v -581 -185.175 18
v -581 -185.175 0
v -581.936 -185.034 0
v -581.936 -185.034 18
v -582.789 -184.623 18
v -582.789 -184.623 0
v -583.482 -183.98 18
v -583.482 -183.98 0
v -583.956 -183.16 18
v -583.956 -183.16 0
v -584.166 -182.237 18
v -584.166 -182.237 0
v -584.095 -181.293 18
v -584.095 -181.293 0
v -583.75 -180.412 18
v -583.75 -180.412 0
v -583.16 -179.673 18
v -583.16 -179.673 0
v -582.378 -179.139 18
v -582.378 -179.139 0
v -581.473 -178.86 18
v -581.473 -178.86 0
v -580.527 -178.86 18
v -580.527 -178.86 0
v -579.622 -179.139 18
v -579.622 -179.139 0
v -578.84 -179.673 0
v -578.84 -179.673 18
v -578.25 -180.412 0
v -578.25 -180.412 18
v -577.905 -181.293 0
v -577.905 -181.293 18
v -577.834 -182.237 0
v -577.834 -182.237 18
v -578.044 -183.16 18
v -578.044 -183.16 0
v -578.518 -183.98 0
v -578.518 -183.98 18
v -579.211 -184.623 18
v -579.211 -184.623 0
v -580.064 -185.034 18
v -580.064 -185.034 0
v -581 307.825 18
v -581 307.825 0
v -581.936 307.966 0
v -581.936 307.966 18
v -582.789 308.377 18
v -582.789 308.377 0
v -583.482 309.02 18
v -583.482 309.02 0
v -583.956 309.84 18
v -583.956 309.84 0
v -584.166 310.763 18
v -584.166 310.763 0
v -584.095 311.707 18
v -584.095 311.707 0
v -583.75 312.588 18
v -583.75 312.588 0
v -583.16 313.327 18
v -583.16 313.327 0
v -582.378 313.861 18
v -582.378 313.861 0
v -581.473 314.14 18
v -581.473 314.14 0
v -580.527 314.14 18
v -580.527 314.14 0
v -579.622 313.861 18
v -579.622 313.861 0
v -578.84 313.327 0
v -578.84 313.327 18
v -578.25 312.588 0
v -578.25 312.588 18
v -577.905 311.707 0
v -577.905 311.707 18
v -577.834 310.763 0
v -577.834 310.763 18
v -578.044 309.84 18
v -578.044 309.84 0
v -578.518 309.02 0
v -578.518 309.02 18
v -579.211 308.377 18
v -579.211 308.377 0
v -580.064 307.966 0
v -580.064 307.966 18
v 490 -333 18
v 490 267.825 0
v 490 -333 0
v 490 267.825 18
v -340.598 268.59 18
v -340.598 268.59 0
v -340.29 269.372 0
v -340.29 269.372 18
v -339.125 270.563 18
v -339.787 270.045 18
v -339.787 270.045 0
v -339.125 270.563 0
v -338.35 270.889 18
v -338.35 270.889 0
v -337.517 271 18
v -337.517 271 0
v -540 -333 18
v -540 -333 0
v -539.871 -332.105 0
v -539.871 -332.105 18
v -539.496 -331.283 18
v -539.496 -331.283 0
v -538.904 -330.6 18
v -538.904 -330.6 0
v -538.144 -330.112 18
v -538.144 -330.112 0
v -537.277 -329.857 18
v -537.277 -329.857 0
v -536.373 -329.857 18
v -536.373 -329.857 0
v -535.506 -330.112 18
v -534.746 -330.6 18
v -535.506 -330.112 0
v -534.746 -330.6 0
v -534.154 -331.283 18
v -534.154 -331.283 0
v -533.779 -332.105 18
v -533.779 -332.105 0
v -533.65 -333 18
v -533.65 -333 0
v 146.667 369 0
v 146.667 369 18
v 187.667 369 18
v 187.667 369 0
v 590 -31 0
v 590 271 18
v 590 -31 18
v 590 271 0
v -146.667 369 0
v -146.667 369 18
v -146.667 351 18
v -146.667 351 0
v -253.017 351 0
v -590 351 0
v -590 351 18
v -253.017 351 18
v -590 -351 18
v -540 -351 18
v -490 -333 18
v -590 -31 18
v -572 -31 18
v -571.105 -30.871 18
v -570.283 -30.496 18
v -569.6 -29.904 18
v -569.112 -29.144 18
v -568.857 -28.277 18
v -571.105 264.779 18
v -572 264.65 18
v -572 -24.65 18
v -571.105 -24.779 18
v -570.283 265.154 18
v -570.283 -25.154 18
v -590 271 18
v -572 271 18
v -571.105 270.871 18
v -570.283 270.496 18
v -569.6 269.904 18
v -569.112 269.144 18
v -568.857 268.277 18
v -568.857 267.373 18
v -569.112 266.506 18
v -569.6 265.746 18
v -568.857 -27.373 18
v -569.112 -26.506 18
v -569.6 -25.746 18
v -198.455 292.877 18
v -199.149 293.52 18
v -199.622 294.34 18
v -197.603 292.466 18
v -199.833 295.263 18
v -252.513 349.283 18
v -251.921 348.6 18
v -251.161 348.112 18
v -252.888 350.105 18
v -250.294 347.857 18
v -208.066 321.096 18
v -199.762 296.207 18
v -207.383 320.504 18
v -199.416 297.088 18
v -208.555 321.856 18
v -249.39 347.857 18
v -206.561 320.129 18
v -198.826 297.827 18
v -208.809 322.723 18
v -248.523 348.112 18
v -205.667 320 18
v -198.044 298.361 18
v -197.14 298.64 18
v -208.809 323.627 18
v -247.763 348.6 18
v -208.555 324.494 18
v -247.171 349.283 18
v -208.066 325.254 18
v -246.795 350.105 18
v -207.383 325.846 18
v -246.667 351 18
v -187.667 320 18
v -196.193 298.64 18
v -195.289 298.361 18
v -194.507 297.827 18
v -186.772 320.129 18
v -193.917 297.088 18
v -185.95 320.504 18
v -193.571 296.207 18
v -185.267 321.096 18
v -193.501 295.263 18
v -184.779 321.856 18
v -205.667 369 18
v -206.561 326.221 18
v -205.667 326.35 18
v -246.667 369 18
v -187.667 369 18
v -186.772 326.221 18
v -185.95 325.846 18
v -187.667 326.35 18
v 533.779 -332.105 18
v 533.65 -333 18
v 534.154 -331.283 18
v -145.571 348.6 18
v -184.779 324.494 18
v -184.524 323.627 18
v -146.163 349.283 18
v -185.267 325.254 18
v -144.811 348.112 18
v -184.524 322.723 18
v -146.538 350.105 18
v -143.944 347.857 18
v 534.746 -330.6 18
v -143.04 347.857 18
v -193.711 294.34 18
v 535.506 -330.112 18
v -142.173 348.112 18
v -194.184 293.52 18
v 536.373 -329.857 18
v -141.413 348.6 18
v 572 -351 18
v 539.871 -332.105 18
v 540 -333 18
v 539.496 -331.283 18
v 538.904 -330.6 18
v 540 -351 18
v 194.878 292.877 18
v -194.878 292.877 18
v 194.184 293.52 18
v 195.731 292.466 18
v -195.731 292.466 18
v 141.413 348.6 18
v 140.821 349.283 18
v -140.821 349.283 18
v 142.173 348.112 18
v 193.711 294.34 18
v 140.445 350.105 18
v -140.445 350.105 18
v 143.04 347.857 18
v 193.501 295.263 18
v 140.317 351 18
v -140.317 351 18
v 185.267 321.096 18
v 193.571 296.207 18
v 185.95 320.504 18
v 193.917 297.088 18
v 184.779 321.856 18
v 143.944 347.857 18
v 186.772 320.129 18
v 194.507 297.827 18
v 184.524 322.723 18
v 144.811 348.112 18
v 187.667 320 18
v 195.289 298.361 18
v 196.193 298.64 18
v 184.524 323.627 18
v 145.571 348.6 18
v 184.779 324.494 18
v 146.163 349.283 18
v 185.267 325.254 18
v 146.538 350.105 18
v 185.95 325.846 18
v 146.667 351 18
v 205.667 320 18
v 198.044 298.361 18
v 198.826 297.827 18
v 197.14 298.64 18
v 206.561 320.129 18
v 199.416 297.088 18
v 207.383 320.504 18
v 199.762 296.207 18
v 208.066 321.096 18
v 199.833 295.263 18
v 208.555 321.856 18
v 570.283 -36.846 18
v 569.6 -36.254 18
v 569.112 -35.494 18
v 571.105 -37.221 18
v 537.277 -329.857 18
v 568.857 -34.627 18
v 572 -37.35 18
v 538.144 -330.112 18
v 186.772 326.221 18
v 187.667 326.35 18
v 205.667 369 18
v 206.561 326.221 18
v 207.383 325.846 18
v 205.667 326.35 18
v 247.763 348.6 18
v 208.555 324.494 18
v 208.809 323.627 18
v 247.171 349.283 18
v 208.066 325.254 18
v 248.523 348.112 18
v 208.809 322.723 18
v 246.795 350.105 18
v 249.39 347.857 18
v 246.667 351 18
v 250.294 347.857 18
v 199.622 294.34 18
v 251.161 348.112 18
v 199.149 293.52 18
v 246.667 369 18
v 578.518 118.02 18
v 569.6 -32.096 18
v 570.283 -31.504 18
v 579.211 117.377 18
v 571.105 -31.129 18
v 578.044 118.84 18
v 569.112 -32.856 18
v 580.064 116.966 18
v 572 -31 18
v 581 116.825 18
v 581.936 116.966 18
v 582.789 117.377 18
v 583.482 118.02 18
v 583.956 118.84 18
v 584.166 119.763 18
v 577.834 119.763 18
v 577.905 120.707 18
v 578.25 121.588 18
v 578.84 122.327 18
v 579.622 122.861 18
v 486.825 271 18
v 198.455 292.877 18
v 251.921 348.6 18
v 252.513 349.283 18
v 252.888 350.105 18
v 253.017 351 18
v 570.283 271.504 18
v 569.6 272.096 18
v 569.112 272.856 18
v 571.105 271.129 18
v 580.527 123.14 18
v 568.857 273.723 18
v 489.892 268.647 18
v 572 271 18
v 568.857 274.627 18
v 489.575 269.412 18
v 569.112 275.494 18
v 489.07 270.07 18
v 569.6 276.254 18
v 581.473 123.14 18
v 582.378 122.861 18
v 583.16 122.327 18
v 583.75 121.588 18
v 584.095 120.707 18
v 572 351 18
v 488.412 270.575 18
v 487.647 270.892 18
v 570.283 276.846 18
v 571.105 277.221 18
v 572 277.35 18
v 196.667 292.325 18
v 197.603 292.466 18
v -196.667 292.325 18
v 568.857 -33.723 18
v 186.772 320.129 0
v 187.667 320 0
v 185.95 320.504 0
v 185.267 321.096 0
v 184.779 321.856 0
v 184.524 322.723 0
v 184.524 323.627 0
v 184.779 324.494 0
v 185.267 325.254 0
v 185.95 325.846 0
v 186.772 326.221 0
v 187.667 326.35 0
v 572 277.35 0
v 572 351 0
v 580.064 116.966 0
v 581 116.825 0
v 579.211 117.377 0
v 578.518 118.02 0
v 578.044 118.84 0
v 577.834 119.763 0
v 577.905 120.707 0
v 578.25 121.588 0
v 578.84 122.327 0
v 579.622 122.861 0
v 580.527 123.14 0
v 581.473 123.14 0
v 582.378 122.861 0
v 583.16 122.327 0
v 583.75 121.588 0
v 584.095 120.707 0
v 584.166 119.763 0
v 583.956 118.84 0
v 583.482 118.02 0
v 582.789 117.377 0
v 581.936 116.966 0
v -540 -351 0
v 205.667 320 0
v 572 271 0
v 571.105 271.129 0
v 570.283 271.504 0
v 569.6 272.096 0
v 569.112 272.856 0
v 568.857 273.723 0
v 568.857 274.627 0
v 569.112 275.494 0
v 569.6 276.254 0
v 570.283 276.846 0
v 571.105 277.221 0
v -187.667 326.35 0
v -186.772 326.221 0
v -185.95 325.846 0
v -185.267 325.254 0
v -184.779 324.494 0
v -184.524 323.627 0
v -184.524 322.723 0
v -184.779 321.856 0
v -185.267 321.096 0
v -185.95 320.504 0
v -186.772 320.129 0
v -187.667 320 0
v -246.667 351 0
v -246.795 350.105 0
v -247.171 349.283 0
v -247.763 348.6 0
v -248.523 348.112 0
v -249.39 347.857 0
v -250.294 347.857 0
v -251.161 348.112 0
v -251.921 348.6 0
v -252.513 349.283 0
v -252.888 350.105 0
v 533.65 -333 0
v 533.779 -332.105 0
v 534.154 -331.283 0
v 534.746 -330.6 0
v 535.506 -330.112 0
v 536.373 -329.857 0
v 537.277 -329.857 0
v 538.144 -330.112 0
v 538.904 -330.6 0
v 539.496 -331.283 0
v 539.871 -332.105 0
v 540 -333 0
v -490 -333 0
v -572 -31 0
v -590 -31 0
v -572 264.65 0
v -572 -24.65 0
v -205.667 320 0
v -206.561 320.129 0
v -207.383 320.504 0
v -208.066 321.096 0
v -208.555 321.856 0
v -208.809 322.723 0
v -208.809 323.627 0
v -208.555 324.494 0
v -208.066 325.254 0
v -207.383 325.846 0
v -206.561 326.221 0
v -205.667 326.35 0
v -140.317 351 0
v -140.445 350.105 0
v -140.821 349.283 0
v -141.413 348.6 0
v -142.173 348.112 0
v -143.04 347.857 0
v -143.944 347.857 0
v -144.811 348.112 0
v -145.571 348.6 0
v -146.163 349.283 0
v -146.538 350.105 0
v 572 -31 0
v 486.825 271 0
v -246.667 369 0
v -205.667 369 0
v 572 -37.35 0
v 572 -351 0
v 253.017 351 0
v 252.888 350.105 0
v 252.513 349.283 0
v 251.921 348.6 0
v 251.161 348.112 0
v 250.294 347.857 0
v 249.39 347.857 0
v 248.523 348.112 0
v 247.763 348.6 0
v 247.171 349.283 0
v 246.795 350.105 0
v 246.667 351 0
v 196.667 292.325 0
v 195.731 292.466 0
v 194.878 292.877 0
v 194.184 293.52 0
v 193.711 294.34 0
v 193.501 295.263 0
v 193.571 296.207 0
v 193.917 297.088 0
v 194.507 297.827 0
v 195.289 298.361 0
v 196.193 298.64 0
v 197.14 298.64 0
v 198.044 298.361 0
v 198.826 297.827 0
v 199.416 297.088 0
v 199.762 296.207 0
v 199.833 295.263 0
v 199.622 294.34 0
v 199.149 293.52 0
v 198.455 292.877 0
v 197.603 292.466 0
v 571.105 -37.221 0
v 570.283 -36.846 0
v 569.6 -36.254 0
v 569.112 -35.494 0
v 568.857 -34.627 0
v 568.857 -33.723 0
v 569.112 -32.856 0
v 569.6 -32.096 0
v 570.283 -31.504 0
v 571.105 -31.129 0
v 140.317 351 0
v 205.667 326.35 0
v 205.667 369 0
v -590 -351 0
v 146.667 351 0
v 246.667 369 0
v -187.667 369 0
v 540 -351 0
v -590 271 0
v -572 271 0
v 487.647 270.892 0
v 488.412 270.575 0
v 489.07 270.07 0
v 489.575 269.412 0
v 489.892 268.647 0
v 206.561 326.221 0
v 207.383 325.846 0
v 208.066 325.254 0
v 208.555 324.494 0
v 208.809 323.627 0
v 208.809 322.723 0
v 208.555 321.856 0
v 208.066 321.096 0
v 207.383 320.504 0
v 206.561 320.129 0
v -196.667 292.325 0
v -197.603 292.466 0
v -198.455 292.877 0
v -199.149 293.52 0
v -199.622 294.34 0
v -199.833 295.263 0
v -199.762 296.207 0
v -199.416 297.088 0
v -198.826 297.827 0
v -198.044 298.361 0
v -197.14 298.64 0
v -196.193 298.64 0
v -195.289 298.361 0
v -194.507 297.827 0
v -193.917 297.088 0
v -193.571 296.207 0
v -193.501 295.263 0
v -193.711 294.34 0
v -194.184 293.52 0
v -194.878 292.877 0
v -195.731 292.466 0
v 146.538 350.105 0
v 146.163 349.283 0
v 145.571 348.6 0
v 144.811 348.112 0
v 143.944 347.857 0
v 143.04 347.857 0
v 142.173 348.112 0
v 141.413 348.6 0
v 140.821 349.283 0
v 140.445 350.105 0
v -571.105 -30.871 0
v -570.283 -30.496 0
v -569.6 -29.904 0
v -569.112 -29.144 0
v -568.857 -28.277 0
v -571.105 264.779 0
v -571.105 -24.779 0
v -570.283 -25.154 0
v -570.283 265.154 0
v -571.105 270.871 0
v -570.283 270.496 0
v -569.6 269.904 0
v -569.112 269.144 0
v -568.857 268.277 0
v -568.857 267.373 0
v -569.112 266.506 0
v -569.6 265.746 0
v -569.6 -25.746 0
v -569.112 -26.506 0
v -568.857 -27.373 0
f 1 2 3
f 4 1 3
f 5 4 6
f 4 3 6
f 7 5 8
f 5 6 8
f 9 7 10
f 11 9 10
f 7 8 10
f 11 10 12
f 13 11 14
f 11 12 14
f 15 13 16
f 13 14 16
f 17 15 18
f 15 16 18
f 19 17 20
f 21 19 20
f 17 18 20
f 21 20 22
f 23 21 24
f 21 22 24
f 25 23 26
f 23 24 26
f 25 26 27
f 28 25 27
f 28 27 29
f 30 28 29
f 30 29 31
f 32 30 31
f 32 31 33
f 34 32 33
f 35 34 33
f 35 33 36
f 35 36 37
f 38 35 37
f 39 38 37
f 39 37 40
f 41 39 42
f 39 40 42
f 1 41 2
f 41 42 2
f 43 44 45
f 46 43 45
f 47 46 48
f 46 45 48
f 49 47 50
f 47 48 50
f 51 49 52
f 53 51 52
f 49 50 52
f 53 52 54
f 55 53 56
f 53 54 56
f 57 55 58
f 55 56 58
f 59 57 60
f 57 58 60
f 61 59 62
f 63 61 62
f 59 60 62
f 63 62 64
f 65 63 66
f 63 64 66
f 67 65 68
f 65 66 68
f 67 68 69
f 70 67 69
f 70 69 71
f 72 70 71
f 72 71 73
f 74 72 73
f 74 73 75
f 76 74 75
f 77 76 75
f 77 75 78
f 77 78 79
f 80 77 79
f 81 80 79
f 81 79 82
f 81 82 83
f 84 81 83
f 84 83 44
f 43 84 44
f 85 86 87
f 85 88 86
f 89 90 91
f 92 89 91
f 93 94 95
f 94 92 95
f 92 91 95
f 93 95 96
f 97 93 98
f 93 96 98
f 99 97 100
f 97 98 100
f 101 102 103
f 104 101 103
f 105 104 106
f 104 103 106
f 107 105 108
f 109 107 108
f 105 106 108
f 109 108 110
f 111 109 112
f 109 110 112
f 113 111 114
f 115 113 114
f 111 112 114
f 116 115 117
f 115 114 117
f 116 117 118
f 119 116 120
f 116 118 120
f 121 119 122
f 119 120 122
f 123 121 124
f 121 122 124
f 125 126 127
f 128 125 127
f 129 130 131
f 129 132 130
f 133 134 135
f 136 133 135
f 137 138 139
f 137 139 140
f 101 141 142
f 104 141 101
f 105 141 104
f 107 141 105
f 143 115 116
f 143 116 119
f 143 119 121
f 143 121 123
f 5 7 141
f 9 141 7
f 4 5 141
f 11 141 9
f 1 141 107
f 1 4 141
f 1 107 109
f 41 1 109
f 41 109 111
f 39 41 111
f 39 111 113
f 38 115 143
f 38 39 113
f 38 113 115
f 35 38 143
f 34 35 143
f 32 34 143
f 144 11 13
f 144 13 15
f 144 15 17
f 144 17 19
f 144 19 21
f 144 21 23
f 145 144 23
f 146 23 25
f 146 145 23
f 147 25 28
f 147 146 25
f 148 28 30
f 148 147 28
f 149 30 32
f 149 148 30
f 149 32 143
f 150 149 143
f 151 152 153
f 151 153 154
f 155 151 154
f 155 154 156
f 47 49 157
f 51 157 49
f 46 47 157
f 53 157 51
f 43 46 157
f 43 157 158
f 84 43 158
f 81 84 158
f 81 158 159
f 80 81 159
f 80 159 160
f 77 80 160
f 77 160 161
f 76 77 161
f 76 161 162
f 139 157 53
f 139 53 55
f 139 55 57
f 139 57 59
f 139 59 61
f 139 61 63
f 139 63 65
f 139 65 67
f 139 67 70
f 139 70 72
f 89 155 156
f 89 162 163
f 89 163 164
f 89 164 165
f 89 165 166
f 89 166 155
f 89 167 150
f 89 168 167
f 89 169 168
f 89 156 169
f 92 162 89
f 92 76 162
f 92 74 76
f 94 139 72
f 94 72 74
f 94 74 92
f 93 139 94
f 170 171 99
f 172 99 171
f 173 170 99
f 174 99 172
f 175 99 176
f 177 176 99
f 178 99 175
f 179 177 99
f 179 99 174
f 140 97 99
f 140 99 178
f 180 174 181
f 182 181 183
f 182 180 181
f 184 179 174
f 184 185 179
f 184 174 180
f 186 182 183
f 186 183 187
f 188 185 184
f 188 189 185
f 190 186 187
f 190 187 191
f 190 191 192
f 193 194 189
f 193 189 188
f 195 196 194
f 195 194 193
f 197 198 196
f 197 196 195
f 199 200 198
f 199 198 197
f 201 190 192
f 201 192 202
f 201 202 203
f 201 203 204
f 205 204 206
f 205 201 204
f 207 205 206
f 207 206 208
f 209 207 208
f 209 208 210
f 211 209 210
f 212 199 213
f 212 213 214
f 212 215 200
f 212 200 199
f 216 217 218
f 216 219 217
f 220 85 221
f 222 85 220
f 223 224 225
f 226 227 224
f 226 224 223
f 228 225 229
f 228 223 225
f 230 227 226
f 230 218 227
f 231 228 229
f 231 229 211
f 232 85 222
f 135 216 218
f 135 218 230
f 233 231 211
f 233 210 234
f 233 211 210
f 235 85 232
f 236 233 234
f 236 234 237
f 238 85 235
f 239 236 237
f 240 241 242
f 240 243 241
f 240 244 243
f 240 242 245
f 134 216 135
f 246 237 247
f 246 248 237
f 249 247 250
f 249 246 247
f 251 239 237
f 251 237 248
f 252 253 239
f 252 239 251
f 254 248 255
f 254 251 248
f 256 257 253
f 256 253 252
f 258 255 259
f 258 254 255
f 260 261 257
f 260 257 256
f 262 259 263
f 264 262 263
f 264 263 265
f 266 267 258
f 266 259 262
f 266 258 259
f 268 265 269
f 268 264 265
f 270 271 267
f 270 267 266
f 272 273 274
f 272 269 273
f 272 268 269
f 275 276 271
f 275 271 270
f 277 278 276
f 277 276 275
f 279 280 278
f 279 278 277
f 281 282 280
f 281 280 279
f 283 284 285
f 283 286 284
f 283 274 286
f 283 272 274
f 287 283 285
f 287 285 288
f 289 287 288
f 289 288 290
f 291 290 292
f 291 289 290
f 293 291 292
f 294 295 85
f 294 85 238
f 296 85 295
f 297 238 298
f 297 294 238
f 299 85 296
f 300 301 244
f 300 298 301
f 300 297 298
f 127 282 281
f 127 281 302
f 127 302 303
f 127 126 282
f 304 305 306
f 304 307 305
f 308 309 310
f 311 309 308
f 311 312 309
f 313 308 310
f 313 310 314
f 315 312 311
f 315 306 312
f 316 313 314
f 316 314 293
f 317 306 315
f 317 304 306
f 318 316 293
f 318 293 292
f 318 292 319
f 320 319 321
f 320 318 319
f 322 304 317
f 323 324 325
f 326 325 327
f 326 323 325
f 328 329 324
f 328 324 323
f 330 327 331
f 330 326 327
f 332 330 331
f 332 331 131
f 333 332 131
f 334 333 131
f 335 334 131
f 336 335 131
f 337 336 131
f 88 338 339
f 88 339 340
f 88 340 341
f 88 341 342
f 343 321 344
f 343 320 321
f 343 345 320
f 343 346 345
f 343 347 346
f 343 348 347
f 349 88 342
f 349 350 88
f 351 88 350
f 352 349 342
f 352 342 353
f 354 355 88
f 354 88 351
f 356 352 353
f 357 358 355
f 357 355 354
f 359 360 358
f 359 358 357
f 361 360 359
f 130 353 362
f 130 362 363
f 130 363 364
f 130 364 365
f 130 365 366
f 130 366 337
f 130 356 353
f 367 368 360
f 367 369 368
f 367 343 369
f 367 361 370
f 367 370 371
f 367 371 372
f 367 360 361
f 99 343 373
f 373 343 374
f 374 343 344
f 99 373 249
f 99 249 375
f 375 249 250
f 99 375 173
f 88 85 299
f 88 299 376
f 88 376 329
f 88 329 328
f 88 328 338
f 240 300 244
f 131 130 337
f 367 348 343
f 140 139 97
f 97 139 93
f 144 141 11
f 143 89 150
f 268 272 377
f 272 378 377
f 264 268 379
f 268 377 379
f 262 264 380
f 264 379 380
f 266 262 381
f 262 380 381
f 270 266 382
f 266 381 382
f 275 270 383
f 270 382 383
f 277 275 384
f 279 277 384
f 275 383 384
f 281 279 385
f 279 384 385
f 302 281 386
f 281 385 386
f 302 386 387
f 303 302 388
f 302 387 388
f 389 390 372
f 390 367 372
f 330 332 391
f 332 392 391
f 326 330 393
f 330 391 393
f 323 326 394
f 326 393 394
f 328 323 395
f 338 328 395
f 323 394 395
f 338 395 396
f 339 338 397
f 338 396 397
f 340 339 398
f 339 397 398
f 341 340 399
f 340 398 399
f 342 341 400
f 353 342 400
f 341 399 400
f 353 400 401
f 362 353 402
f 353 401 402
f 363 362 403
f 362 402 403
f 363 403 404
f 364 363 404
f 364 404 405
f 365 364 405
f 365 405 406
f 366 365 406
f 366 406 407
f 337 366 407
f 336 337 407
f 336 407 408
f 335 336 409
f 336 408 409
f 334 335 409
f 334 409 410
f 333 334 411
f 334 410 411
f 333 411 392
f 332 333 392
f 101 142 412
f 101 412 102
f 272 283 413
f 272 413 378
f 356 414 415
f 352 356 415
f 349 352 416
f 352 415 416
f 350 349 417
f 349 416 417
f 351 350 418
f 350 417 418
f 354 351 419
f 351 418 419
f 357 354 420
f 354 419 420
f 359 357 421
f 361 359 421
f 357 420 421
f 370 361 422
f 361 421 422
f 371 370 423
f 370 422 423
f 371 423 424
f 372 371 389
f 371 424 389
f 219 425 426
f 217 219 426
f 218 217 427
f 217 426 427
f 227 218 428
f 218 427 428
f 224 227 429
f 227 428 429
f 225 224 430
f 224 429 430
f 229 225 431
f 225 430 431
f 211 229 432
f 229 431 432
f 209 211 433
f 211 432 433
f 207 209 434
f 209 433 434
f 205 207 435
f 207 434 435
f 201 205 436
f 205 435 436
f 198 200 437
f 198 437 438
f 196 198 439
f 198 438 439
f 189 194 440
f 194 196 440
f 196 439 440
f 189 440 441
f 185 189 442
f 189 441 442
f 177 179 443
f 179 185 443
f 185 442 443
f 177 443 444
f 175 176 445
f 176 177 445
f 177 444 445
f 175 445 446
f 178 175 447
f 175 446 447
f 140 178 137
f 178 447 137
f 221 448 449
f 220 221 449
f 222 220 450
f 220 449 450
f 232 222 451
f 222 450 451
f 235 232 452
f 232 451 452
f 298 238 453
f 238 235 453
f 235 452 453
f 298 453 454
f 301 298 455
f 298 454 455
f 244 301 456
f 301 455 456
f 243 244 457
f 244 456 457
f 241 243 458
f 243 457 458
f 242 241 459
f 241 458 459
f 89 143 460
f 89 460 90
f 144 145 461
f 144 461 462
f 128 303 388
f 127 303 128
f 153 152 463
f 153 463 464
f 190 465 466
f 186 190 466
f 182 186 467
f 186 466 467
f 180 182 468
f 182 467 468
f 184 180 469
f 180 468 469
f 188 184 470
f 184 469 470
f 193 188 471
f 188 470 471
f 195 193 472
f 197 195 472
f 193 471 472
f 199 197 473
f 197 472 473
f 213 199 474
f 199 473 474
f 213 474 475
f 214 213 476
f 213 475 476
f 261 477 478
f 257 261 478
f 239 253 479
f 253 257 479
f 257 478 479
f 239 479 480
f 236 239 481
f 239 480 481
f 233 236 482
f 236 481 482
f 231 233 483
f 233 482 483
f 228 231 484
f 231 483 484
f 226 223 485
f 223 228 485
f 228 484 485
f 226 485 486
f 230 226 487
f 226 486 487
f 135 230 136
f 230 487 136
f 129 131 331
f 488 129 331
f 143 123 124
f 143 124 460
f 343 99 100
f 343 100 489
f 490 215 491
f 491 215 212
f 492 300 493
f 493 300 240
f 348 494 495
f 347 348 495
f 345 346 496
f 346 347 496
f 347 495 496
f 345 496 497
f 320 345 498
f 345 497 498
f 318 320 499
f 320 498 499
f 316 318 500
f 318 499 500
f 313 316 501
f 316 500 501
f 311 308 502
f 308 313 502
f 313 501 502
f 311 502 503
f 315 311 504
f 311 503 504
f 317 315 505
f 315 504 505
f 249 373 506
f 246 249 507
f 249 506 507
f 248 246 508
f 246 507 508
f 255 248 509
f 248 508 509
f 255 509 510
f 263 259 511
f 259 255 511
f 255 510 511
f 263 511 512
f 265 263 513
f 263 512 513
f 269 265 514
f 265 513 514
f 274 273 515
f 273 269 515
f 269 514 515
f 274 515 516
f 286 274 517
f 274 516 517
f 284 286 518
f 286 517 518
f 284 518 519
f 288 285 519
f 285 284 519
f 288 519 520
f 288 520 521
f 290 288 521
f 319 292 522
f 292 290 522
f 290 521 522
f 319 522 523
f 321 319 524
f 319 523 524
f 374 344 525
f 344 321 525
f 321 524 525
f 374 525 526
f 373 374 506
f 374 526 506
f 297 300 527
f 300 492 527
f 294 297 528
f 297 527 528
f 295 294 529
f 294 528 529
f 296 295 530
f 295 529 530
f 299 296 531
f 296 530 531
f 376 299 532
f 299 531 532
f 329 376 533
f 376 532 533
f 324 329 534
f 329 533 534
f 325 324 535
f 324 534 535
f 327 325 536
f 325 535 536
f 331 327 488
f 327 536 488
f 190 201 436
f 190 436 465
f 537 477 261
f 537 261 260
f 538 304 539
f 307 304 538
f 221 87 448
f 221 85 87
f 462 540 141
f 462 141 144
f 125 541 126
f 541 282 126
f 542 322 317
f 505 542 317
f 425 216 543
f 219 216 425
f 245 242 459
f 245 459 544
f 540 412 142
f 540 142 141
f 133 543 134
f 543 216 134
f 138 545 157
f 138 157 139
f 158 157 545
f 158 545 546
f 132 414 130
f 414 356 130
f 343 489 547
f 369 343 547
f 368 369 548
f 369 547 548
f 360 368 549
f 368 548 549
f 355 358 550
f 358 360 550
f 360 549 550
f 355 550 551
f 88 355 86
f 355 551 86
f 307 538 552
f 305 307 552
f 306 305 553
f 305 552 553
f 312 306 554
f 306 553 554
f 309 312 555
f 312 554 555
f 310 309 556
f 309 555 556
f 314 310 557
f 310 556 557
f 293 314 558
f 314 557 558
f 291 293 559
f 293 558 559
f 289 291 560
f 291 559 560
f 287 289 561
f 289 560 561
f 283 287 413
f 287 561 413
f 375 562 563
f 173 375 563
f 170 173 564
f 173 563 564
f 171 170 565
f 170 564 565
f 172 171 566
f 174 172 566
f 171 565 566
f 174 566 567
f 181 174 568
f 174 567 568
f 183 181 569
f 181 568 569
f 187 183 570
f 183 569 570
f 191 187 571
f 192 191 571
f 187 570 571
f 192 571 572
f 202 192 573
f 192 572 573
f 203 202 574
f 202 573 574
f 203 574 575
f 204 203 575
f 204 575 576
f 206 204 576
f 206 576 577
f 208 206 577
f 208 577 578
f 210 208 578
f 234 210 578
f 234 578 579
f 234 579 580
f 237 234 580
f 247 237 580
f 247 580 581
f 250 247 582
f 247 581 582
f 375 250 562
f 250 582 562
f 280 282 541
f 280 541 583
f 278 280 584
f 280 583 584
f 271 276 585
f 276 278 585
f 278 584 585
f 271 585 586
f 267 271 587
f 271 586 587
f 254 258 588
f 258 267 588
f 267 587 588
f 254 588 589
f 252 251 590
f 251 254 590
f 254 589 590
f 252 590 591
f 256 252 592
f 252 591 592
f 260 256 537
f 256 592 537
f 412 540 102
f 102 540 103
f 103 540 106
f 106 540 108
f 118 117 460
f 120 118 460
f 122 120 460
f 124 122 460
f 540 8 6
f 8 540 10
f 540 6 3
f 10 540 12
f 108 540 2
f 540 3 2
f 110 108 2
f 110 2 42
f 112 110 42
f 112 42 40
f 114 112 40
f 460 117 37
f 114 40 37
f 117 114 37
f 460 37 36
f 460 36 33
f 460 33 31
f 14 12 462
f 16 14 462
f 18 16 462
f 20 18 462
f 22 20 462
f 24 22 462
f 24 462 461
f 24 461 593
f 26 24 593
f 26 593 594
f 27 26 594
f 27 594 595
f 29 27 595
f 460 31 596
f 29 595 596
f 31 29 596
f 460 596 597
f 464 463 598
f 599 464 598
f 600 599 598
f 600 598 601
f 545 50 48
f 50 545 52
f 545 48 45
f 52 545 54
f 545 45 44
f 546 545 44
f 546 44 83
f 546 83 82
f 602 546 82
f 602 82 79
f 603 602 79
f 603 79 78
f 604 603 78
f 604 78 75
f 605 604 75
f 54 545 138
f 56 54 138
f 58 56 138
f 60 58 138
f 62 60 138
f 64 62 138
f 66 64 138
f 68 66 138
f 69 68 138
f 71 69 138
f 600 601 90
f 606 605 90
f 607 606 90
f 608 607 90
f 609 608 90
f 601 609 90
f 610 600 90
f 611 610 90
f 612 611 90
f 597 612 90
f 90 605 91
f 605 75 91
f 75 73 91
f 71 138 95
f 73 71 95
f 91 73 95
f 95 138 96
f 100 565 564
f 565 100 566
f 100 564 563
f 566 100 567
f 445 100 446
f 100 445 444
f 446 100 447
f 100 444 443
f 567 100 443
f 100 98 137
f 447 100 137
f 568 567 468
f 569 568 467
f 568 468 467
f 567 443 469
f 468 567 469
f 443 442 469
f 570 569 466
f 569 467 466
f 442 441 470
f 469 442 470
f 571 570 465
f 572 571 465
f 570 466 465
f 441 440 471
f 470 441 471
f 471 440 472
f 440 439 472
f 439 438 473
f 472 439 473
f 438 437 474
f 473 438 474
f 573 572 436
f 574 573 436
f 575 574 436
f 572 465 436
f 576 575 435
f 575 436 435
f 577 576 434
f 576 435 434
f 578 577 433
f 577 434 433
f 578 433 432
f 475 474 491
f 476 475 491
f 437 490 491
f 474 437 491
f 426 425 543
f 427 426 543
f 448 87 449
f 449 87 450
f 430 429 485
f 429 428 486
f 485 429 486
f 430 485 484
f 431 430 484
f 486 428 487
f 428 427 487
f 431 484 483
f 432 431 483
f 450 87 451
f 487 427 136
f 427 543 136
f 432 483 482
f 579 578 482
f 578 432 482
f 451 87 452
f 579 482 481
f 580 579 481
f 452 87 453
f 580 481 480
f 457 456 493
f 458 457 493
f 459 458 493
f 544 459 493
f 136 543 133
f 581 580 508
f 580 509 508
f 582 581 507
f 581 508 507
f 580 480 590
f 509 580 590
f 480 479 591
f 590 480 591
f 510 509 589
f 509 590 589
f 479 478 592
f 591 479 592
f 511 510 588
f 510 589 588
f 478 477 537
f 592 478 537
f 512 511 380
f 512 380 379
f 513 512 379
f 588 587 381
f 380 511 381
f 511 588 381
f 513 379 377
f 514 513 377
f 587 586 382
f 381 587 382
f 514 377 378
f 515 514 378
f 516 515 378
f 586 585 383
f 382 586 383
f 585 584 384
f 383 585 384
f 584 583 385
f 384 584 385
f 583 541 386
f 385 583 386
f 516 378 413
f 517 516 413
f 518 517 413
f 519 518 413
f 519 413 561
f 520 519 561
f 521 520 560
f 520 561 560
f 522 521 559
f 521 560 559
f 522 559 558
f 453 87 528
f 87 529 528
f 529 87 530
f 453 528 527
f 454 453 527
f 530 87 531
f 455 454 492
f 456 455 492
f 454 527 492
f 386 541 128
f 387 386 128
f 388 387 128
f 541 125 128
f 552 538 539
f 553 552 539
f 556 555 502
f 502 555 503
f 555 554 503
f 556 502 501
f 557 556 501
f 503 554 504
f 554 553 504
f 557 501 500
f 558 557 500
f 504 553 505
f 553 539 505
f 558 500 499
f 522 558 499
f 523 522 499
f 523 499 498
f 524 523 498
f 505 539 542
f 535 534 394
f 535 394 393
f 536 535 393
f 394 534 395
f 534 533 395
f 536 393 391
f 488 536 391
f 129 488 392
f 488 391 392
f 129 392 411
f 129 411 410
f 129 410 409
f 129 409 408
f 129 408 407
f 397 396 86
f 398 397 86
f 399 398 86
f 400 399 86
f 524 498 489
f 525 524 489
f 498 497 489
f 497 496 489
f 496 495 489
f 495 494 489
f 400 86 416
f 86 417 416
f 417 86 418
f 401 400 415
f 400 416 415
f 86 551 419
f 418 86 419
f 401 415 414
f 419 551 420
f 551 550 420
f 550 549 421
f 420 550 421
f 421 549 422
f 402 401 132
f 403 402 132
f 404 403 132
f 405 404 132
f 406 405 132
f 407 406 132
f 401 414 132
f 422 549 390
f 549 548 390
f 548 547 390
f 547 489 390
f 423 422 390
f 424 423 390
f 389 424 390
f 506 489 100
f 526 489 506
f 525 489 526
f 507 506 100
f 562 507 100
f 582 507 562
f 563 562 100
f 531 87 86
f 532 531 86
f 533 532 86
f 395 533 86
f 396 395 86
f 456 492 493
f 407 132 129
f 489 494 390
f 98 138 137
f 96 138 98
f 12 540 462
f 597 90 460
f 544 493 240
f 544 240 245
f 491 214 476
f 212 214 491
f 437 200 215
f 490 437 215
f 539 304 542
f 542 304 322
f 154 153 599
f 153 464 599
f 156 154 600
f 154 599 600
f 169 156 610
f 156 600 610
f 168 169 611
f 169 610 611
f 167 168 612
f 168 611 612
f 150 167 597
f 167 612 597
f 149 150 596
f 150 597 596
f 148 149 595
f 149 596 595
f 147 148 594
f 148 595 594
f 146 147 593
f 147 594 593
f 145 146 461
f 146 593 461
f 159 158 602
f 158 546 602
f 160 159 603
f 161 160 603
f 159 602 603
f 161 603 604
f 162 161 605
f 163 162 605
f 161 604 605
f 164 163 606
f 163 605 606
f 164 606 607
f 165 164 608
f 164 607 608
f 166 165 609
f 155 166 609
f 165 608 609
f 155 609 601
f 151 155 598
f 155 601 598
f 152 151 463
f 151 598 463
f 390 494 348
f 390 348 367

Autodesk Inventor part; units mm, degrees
sketch "Sketch1" plane through (0, 0, 0) normal (0, 0, 1) x (1, 0, 0)
  line L0 (-590, 351) -> (590, 351)
  line L1 (590, 351) -> (590, -351)
  line L2 (590, -351) -> (-590, -351)
  line L3 (-590, -351) -> (-590, 351)
  point P0 (0, 0)
  point P1 (590, 0)
  point P2 (0, 351)
  dimension "d0" = 1180
  dimension "d1" = 702
extrude "Extrusion1" add sketch "Sketch1" along normal blind 18
sketch "Sketch2" plane through (0, 0, 18) normal (0, 0, 1) x (1, 0, 0)
  line L0 (590, 351) -> (-590, 351) projected
  line L1 (-590, 351) -> (-590, -351) projected
  line L2 (-590, -351) -> (590, -351) projected
  line L3 (590, -351) -> (590, 351) projected
  line L4 (-590, -351) -> (-490, -351) construction
  line L5 (-590, 351) -> (-590, -351) construction
  line L6 (590, 351) -> (-590, 351) construction
  line L7 (0, 351) -> (0, -351) construction
  line L8 (590, -351) -> (490, -351) construction
  line L9 (-590, 271) -> (590, 271) construction
  line L10 (-590, 271) -> (-340, 271) construction
  line L11 (-340, 271) -> (490, 271)
  line L12 (490, 271) -> (490, -351)
  line L13 (490, -351) -> (-490, -351)
  line L14 (-490, -351) -> (-490, -333)
  line L15 (-490, -333) -> (-340, 271)
  point P0 (0, 0)
  point P1 (-590, 0)
  point P2 (-590, 0)
  point P3 (-540, -351)
  point P4 (540, -351)
  point P5 (-590, 0)
  point P6 (590, 0)
  point P7 (-590, 0)
  point P8 (-465, 271)
  point P9 (0, 271)
  dimension "d4" = 100
  dimension "d5" = 80
  dimension "d6" = 250
  dimension "d97" = 18
extrude "Extrusion2" cut sketch "Sketch2" against normal blind 18 contours L2 L14 L15 L11 L12
sketch "Sketch3" plane through (0, 0, 18) normal (0, 0, 1) x (1, 0, 0)
  line L0 (-340, 271) -> (490, 271) projected
  line L1 (490, 271) -> (490, -351) projected
  line L2 (490, -351) -> (590, -351) projected
  line L3 (590, -351) -> (590, 351) projected
  line L4 (590, 351) -> (-590, 351) projected
  line L5 (-590, 351) -> (-590, -351) projected
  line L6 (-540, -333) -> (540, -333)
  line L7 (540, -333) -> (540, -351)
  line L8 (540, -351) -> (-540, -351)
  line L9 (-540, -351) -> (-540, -333)
  line L10 (490, -351) -> (590, -351) projected
  line L11 (-590, -351) -> (590, -351) projected
  line L12 (-590, -351) -> (-490, -351) projected
  line L13 (-490, -351) -> (-490, -333) projected
  line L14 (-490, -333) -> (-340, 271) projected
  point P0 (0, 0)
  point P1 (540, -351)
  point P2 (0, -351)
  point P3 (-540, -351)
  point P4 (540, -342)
  point P5 (540, -351)
  point P6 (-540, -342)
  point P7 (-540, -351)
  dimension "d10" = 18
extrude "Extrusion3" cut sketch "Sketch3" against normal blind 18 contours L13 L8 L9 L6 | L6 L1 L8 L13 | L6 L7 L2 L1
sketch "Sketch4" plane through (0, 0, 18) normal (0, 0, 1) x (1, 0, 0)
  line L0 (540, -333) -> (540, -351) projected
  line L1 (540, -351) -> (590, -351) projected
  line L2 (590, -351) -> (590, 351) projected
  line L3 (590, 351) -> (-590, 351) projected
  line L4 (-590, 351) -> (-590, -351) projected
  line L5 (-590, -351) -> (-540, -351) projected
  line L6 (-540, -351) -> (-540, -333) projected
  line L7 (-540, -333) -> (-490, -333) projected
  line L8 (-340, 271) -> (490, 271) projected
  line L9 (490, 271) -> (490, -333) projected
  line L10 (490, -333) -> (540, -333) projected
  line L11 (590, -31) -> (572, -31)
  line L12 (572, -31) -> (572, -351)
  line L13 (572, -351) -> (590, -351)
  line L14 (590, -351) -> (590, -31)
  line L15 (-490, -333) -> (-340, 271) projected
  point P0 (0, 0)
  point P1 (581, -351)
  point P2 (565, -351)
  point P3 (590, -191)
  point P4 (590, 0)
  point P5 (581, -31)
  point P6 (490, -31)
  dimension "d13" = 18
extrude "Extrusion4" cut sketch "Sketch4" against normal blind 18 contours L12 L11 L2 L1
sketch "Sketch5" plane through (0, 0, 18) normal (0, 0, 1) x (1, 0, 0)
  line L0 (-590, 271) -> (-572, 271)
  line L1 (-572, 271) -> (-572, -31)
  line L2 (-572, -31) -> (-590, -31)
  line L3 (-590, -31) -> (-590, 271)
  line L4 (572, -31) -> (590, -31) projected
  line L5 (590, -31) -> (590, 351) projected
  line L6 (590, 351) -> (-590, 351) projected
  line L7 (-590, 351) -> (-590, -351) projected
  line L8 (-590, -351) -> (-540, -351) projected
  line L9 (-540, -351) -> (-540, -333) projected
  line L10 (-540, -333) -> (-490, -333) projected
  line L11 (-340, 271) -> (490, 271) projected
  line L12 (490, 271) -> (490, -333) projected
  line L13 (490, -333) -> (540, -333) projected
  line L14 (540, -333) -> (540, -351) projected
  line L15 (540, -351) -> (572, -351) projected
  line L16 (572, -351) -> (572, -31) projected
  line L17 (-490, -333) -> (-340, 271) projected
  point P0 (0, 0)
  point P1 (-581, -31)
  point P2 (581, -31)
  point P3 (-581, 271)
  point P4 (75, 271)
  point P5 (-590, 120)
  point P6 (-590, 0)
  dimension "d16" = 18
extrude "Extrusion5" cut sketch "Sketch5" against normal blind 18 contours L0 L1 L2 L3
sketch "Sketch6" plane through (0, 0, 18) normal (0, 0, 1) x (1, 0, 0)
  line L0 (-590, 271) -> (-572, 271) projected
  line L1 (-572, 271) -> (-572, -31) projected
  line L2 (-572, -31) -> (-590, -31) projected
  line L3 (-590, -31) -> (-590, -351) projected
  line L4 (-590, -351) -> (-540, -351) projected
  line L5 (-540, -351) -> (-540, -333) projected
  line L6 (-540, -333) -> (-490, -333) projected
  line L7 (-340, 271) -> (490, 271) projected
  line L8 (490, 271) -> (490, -333) projected
  line L9 (490, -333) -> (540, -333) projected
  line L10 (540, -333) -> (540, -351) projected
  line L11 (540, -351) -> (572, -351) projected
  line L12 (572, -351) -> (572, -31) projected
  line L13 (572, -31) -> (590, -31) projected
  line L14 (590, -31) -> (590, 351) projected
  line L15 (590, 351) -> (-590, 351) projected
  line L16 (-590, 351) -> (-590, 271) projected
  line L17 (590, 351) -> (572, 351)
  line L18 (572, 351) -> (572, 271)
  line L19 (572, 271) -> (590, 271)
  line L20 (590, 271) -> (590, 351)
  line L21 (-490, -333) -> (-340, 271) projected
  point P0 (0, 0)
  point P1 (581, 351)
  point P2 (0, 351)
  point P3 (581, 271)
  point P4 (75, 271)
  point P5 (590, 311)
  point P6 (590, 160)
  dimension "d19" = 18
extrude "Extrusion6" cut sketch "Sketch6" against normal blind 18 contours L15 L14 L19 L18
fillet "Fillet1" radius 3.175 2 edges at (-340, 271, 9) (490, 271, 9)
sketch "Sketch7" plane through (0, 0, 18) normal (0, 0, 1) x (1, 0, 0)
  line L0 (-246.6667, 369) -> (-146.6667, 369)
  line L1 (-146.6667, 369) -> (-146.6667, 351)
  line L2 (-146.6667, 351) -> (-246.6667, 351)
  line L3 (-246.6667, 351) -> (-246.6667, 369)
  line L4 (590, 271) -> (572, 271) projected
  line L5 (572, 271) -> (572, 351) projected
  line L6 (572, 351) -> (-590, 351) projected
  line L7 (-590, 351) -> (-590, 271) projected
  line L8 (-590, 271) -> (-572, 271) projected
  line L9 (-572, 271) -> (-572, -31) projected
  line L10 (-572, -31) -> (-590, -31) projected
  line L11 (-590, -31) -> (-590, -351) projected
  line L12 (-590, -351) -> (-540, -351) projected
  line L13 (-540, -351) -> (-540, -333) projected
  line L14 (-540, -333) -> (-490, -333) projected
  arc A0 (-337.517, 271) -> (-340.5984, 268.5902) centre (-337.517, 267.825) ccw projected
  line L15 (-337.517, 271) -> (486.825, 271) projected
  arc A1 (490, 267.825) -> (486.825, 271) centre (486.825, 267.825) ccw projected
  line L16 (490, 267.825) -> (490, -333) projected
  line L17 (490, -333) -> (540, -333) projected
  line L18 (540, -333) -> (540, -351) projected
  line L19 (540, -351) -> (572, -351) projected
  line L20 (572, -351) -> (572, -31) projected
  line L21 (572, -31) -> (590, -31) projected
  line L22 (590, -31) -> (590, 271) projected
  line L23 (-490, -333) -> (-340.5984, 268.5902) projected
  point P0 (0, 0)
  point P1 (-196.6667, 351)
  point P2 (-9, 351)
  dimension "d23" = 18
  dimension "d24" = 100
  dimension "d25" = 393.3333
extrude "Extrusion7" add sketch "Sketch7" against normal blind 18 contours L0 L1 L2 L3
ref_plane "Work Plane1" through (0, 351, 0) normal (-1, 0, 0) x (0, 0, 1)
mirror "Mirror1" about plane through (0, 351, 0) normal (-1, 0, 0) of "Extrusion7"
sketch "Sketch8" plane through (0, 0, 18) normal (0, 0, 1) x (1, 0, 0)
  line L0 (590, 271) -> (572, 271) projected
  line L1 (572, 271) -> (572, 351) projected
  line L2 (572, 351) -> (246.6667, 351) projected
  line L3 (246.6667, 351) -> (246.6667, 369) projected
  line L4 (246.6667, 369) -> (146.6667, 369) projected
  line L5 (146.6667, 369) -> (146.6667, 351) projected
  line L6 (146.6667, 351) -> (-146.6667, 351) projected
  line L7 (-146.6667, 369) -> (-146.6667, 351) projected
  line L8 (-246.6667, 369) -> (-146.6667, 369) projected
  line L9 (-246.6667, 351) -> (-246.6667, 369) projected
  line L10 (-246.6667, 351) -> (-590, 351) projected
  line L11 (-590, 351) -> (-590, 271) projected
  line L12 (-590, 271) -> (-572, 271) projected
  line L13 (-572, 271) -> (-572, -31) projected
  line L14 (-572, -31) -> (-590, -31) projected
  line L15 (-590, -31) -> (-590, -351) projected
  line L16 (-590, -351) -> (-540, -351) projected
  line L17 (-540, -351) -> (-540, -333) projected
  line L18 (-540, -333) -> (-490, -333) projected
  arc A0 (-337.517, 271) -> (-340.5984, 268.5902) centre (-337.517, 267.825) ccw projected
  line L19 (-337.517, 271) -> (486.825, 271) projected
  arc A1 (490, 267.825) -> (486.825, 271) centre (486.825, 267.825) ccw projected
  line L20 (490, 267.825) -> (490, -333) projected
  line L21 (490, -333) -> (540, -333) projected
  line L22 (540, -333) -> (540, -351) projected
  line L23 (540, -351) -> (572, -351) projected
  line L24 (572, -351) -> (572, -31) projected
  line L25 (572, -31) -> (590, -31) projected
  line L26 (590, -31) -> (590, 271) projected
  line L27 (-205.6667, 369) -> (-187.6667, 369)
  line L28 (-187.6667, 369) -> (-187.6667, 320)
  line L29 (-187.6667, 320) -> (-205.6667, 320)
  line L30 (-205.6667, 320) -> (-205.6667, 369)
  line L31 (-246.6667, 369) -> (-146.6667, 369) projected
  line L32 (486.825, 271) -> (-337.517, 271) construction
  line L33 (-490, -333) -> (-340.5984, 268.5902) projected
  point P0 (0, 0)
  point P1 (-196.6667, 369)
  point P2 (-196.6667, 369)
  point P3 (-196.6667, 369)
  point P4 (-196.6667, 320)
  point P5 (-590, 311)
  point P6 (-246.6667, 320)
  dimension "d28" = 18
  dimension "d31" = 49
extrude "Extrusion8" cut sketch "Sketch8" against normal blind 18 contours L28 L29 L30 L8
mirror "Mirror2" about plane through (0, 351, 0) normal (-1, 0, 0) of "Extrusion8"
sketch "Sketch9" plane through (0, 0, 18) normal (0, 0, 1) x (1, 0, 0)
  line L0 (187.6667, 320) -> (187.6667, 369) projected
  line L1 (187.6667, 369) -> (146.6667, 369) projected
  line L2 (146.6667, 369) -> (146.6667, 351) projected
  line L3 (146.6667, 351) -> (-146.6667, 351) projected
  line L4 (-146.6667, 369) -> (-146.6667, 351) projected
  line L5 (-187.6667, 369) -> (-146.6667, 369) projected
  line L6 (-187.6667, 369) -> (-187.6667, 320) projected
  line L7 (-187.6667, 320) -> (-205.6667, 320) projected
  line L8 (-205.6667, 320) -> (-205.6667, 369) projected
  line L9 (-246.6667, 369) -> (-205.6667, 369) projected
  line L10 (-246.6667, 351) -> (-246.6667, 369) projected
  line L11 (-246.6667, 351) -> (-590, 351) projected
  line L12 (-590, 351) -> (-590, 271) projected
  line L13 (-590, 271) -> (-572, 271) projected
  line L14 (-572, 271) -> (-572, -31) projected
  line L15 (-572, -31) -> (-590, -31) projected
  line L16 (-590, -31) -> (-590, -351) projected
  line L17 (-590, -351) -> (-540, -351) projected
  line L18 (-540, -351) -> (-540, -333) projected
  line L19 (-540, -333) -> (-490, -333) projected
  arc A0 (-337.517, 271) -> (-340.5984, 268.5902) centre (-337.517, 267.825) ccw projected
  line L20 (-337.517, 271) -> (486.825, 271) projected
  arc A1 (490, 267.825) -> (486.825, 271) centre (486.825, 267.825) ccw projected
  line L21 (490, 267.825) -> (490, -333) projected
  line L22 (490, -333) -> (540, -333) projected
  line L23 (540, -333) -> (540, -351) projected
  line L24 (540, -351) -> (572, -351) projected
  line L25 (572, -351) -> (572, -31) projected
  line L26 (572, -31) -> (590, -31) projected
  line L27 (590, -31) -> (590, 271) projected
  line L28 (590, 271) -> (572, 271) projected
  line L29 (572, 271) -> (572, 351) projected
  line L30 (572, 351) -> (246.6667, 351) projected
  line L31 (246.6667, 351) -> (246.6667, 369) projected
  line L32 (246.6667, 369) -> (205.6667, 369) projected
  line L33 (205.6667, 369) -> (205.6667, 320) projected
  line L34 (205.6667, 320) -> (187.6667, 320) projected
  line L35 (-490, -333) -> (-340.5984, 268.5902) projected
  point P0 (0, 0)
  point P1 (-581, 311)
  point P2 (-590, 311)
  dimension "d32" = 9
hole "Hole1" at (-581, 311, 18) direction (0, 0, -1) diameter 6.35 end through all
sketch "Sketch10" plane through (0, 0, 18) normal (0, 0, 1) x (1, 0, 0)
  circle A0 centre (-581, 311) radius 3.175 projected
  line L0 (187.6667, 320) -> (187.6667, 369) projected
  line L1 (187.6667, 369) -> (146.6667, 369) projected
  line L2 (146.6667, 369) -> (146.6667, 351) projected
  line L3 (146.6667, 351) -> (-146.6667, 351) projected
  line L4 (-146.6667, 369) -> (-146.6667, 351) projected
  line L5 (-187.6667, 369) -> (-146.6667, 369) projected
  line L6 (-187.6667, 369) -> (-187.6667, 320) projected
  line L7 (-187.6667, 320) -> (-205.6667, 320) projected
  line L8 (-205.6667, 320) -> (-205.6667, 369) projected
  line L9 (-246.6667, 369) -> (-205.6667, 369) projected
  line L10 (-246.6667, 351) -> (-246.6667, 369) projected
  line L11 (-246.6667, 351) -> (-590, 351) projected
  line L12 (-590, 351) -> (-590, 271) projected
  line L13 (-590, 271) -> (-572, 271) projected
  line L14 (-572, 271) -> (-572, -31) projected
  line L15 (-572, -31) -> (-590, -31) projected
  line L16 (-590, -31) -> (-590, -351) projected
  line L17 (-590, -351) -> (-540, -351) projected
  line L18 (-540, -351) -> (-540, -333) projected
  line L19 (-540, -333) -> (-490, -333) projected
  arc A1 (-337.517, 271) -> (-340.5984, 268.5902) centre (-337.517, 267.825) ccw projected
  line L20 (-337.517, 271) -> (486.825, 271) projected
  arc A2 (490, 267.825) -> (486.825, 271) centre (486.825, 267.825) ccw projected
  line L21 (490, 267.825) -> (490, -333) projected
  line L22 (490, -333) -> (540, -333) projected
  line L23 (540, -333) -> (540, -351) projected
  line L24 (540, -351) -> (572, -351) projected
  line L25 (572, -351) -> (572, -31) projected
  line L26 (572, -31) -> (590, -31) projected
  line L27 (590, -31) -> (590, 271) projected
  line L28 (590, 271) -> (572, 271) projected
  line L29 (572, 271) -> (572, 351) projected
  line L30 (572, 351) -> (246.6667, 351) projected
  line L31 (246.6667, 351) -> (246.6667, 369) projected
  line L32 (246.6667, 369) -> (205.6667, 369) projected
  line L33 (205.6667, 369) -> (205.6667, 320) projected
  line L34 (205.6667, 320) -> (187.6667, 320) projected
  line L35 (-581, -31) -> (-581, -333) construction
  line L36 (-490, -333) -> (-340.5984, 268.5902) projected
  point P0 (0, 0)
  point P1 (-581, -31)
  point P2 (-515, -333)
  point P3 (-581, -182)
  dimension "d40" = 9
hole "Hole2" at (-581, -182, 18) direction (0, 0, -1) diameter 6.35 end through all
sketch "Sketch11" plane through (0, 0, 18) normal (0, 0, 1) x (1, 0, 0)
  circle A0 centre (-581, -182) radius 3.175 projected
  circle A1 centre (-581, 311) radius 3.175 projected
  line L0 (187.6667, 320) -> (187.6667, 369) projected
  line L1 (187.6667, 369) -> (146.6667, 369) projected
  line L2 (146.6667, 369) -> (146.6667, 351) projected
  line L3 (146.6667, 351) -> (-146.6667, 351) projected
  line L4 (-146.6667, 369) -> (-146.6667, 351) projected
  line L5 (-187.6667, 369) -> (-146.6667, 369) projected
  line L6 (-187.6667, 369) -> (-187.6667, 320) projected
  line L7 (-187.6667, 320) -> (-205.6667, 320) projected
  line L8 (-205.6667, 320) -> (-205.6667, 369) projected
  line L9 (-246.6667, 369) -> (-205.6667, 369) projected
  line L10 (-246.6667, 351) -> (-246.6667, 369) projected
  line L11 (-246.6667, 351) -> (-590, 351) projected
  line L12 (-590, 351) -> (-590, 271) projected
  line L13 (-590, 271) -> (-572, 271) projected
  line L14 (-572, 271) -> (-572, -31) projected
  line L15 (-572, -31) -> (-590, -31) projected
  line L16 (-590, -31) -> (-590, -351) projected
  line L17 (-590, -351) -> (-540, -351) projected
  line L18 (-540, -351) -> (-540, -333) projected
  line L19 (-540, -333) -> (-490, -333) projected
  arc A2 (-337.517, 271) -> (-340.5984, 268.5902) centre (-337.517, 267.825) ccw projected
  line L20 (-337.517, 271) -> (486.825, 271) projected
  arc A3 (490, 267.825) -> (486.825, 271) centre (486.825, 267.825) ccw projected
  line L21 (490, 267.825) -> (490, -333) projected
  line L22 (490, -333) -> (540, -333) projected
  line L23 (540, -333) -> (540, -351) projected
  line L24 (540, -351) -> (572, -351) projected
  line L25 (572, -351) -> (572, -31) projected
  line L26 (572, -31) -> (590, -31) projected
  line L27 (590, -31) -> (590, 271) projected
  line L28 (590, 271) -> (572, 271) projected
  line L29 (572, 271) -> (572, 351) projected
  line L30 (572, 351) -> (246.6667, 351) projected
  line L31 (246.6667, 351) -> (246.6667, 369) projected
  line L32 (246.6667, 369) -> (205.6667, 369) projected
  line L33 (205.6667, 369) -> (205.6667, 320) projected
  line L34 (205.6667, 320) -> (187.6667, 320) projected
  line L35 (-490, -333) -> (-340.5984, 268.5902) projected
  point P0 (0, 0)
  point P1 (581, 120)
  point P2 (590, 120)
  dimension "d48" = 9
hole "Hole3" at (581, 120, 18) direction (0, 0, -1) diameter 6.35 end through all
sketch "Sketch12" plane through (0, 0, 18) normal (0, 0, 1) x (1, 0, 0)
  circle A0 centre (581, 120) radius 3.175 projected
  circle A1 centre (-581, -182) radius 3.175 projected
  circle A2 centre (-581, 311) radius 3.175 projected
  line L0 (187.6667, 320) -> (187.6667, 369) projected
  line L1 (187.6667, 369) -> (146.6667, 369) projected
  line L2 (146.6667, 369) -> (146.6667, 351) projected
  line L3 (146.6667, 351) -> (-146.6667, 351) projected
  line L4 (-146.6667, 369) -> (-146.6667, 351) projected
  line L5 (-187.6667, 369) -> (-146.6667, 369) projected
  line L6 (-187.6667, 369) -> (-187.6667, 320) projected
  line L7 (-187.6667, 320) -> (-205.6667, 320) projected
  line L8 (-205.6667, 320) -> (-205.6667, 369) projected
  line L9 (-246.6667, 369) -> (-205.6667, 369) projected
  line L10 (-246.6667, 351) -> (-246.6667, 369) projected
  line L11 (-246.6667, 351) -> (-590, 351) projected
  line L12 (-590, 351) -> (-590, 271) projected
  line L13 (-590, 271) -> (-572, 271) projected
  line L14 (-572, 271) -> (-572, -31) projected
  line L15 (-572, -31) -> (-590, -31) projected
  line L16 (-590, -31) -> (-590, -351) projected
  line L17 (-590, -351) -> (-540, -351) projected
  line L18 (-540, -351) -> (-540, -333) projected
  line L19 (-540, -333) -> (-490, -333) projected
  arc A3 (-337.517, 271) -> (-340.5984, 268.5902) centre (-337.517, 267.825) ccw projected
  line L20 (-337.517, 271) -> (486.825, 271) projected
  arc A4 (490, 267.825) -> (486.825, 271) centre (486.825, 267.825) ccw projected
  line L21 (490, 267.825) -> (490, -333) projected
  line L22 (490, -333) -> (540, -333) projected
  line L23 (540, -333) -> (540, -351) projected
  line L24 (540, -351) -> (572, -351) projected
  line L25 (572, -351) -> (572, -31) projected
  line L26 (572, -31) -> (590, -31) projected
  line L27 (590, -31) -> (590, 271) projected
  line L28 (590, 271) -> (572, 271) projected
  line L29 (572, 271) -> (572, 351) projected
  line L30 (572, 351) -> (246.6667, 351) projected
  line L31 (246.6667, 351) -> (246.6667, 369) projected
  line L32 (246.6667, 369) -> (205.6667, 369) projected
  line L33 (205.6667, 369) -> (205.6667, 320) projected
  line L34 (205.6667, 320) -> (187.6667, 320) projected
  line L35 (-196.6667, 320) -> (-196.6667, 271) construction
  line L36 (-187.6667, 320) -> (-205.6667, 320) construction
  line L37 (-490, -333) -> (-340.5984, 268.5902) projected
  point P0 (0, 0)
  point P1 (74.654, 271)
  point P2 (-196.6667, 295.5)
  point P3 (-196.6667, 295.5)
hole "Hole4" at (-196.6667, 295.5, 18) direction (0, 0, -1) diameter 6.35 end through all
mirror "Mirror3" about plane through (0, 351, 0) normal (-1, 0, 0) of "Hole4"
sketch "Sketch13" plane through (0, 0, 18) normal (0, 0, 1) x (1, 0, 0)
  line L0 (-590, 271) -> (-572, 271) projected
  point P0 (0, 0)
  point P1 (-572, 267.825)
  dimension "d63" = 3.175
hole "Hole5" at (-572, 267.825, 18) direction (0, 0, -1) diameter 6.35 end through all
ref_plane "Work Plane2" through (-590, 120, 0) normal (0, -1, 0) x (1, 0, 0)
mirror "Mirror4" about plane through (-590, 120, 0) normal (0, -1, 0) of "Hole5"
sketch "Sketch14" plane through (0, 0, 18) normal (0, 0, 1) x (1, 0, 0)
  arc A0 (-572, -31) -> (-572, -24.65) centre (-572, -27.825) ccw projected
  line L0 (-572, -31) -> (-590, -31) projected
  line L1 (-590, -31) -> (-590, -351) projected
  line L2 (-590, -351) -> (-540, -351) projected
  line L3 (-540, -351) -> (-540, -333) projected
  line L4 (-540, -333) -> (-490, -333) projected
  arc A1 (-337.517, 271) -> (-340.5984, 268.5902) centre (-337.517, 267.825) ccw projected
  line L5 (-337.517, 271) -> (486.825, 271) projected
  arc A2 (490, 267.825) -> (486.825, 271) centre (486.825, 267.825) ccw projected
  line L6 (490, 267.825) -> (490, -333) projected
  line L7 (490, -333) -> (540, -333) projected
  line L8 (540, -333) -> (540, -351) projected
  line L9 (540, -351) -> (572, -351) projected
  line L10 (572, -351) -> (572, -31) projected
  line L11 (572, -31) -> (590, -31) projected
  line L12 (590, -31) -> (590, 271) projected
  line L13 (590, 271) -> (572, 271) projected
  line L14 (572, 271) -> (572, 351) projected
  line L15 (572, 351) -> (246.6667, 351) projected
  line L16 (246.6667, 351) -> (246.6667, 369) projected
  line L17 (246.6667, 369) -> (205.6667, 369) projected
  line L18 (205.6667, 369) -> (205.6667, 320) projected
  line L19 (205.6667, 320) -> (187.6667, 320) projected
  line L20 (187.6667, 320) -> (187.6667, 369) projected
  line L21 (187.6667, 369) -> (146.6667, 369) projected
  line L22 (146.6667, 369) -> (146.6667, 351) projected
  line L23 (146.6667, 351) -> (-146.6667, 351) projected
  line L24 (-146.6667, 369) -> (-146.6667, 351) projected
  line L25 (-187.6667, 369) -> (-146.6667, 369) projected
  line L26 (-187.6667, 369) -> (-187.6667, 320) projected
  line L27 (-187.6667, 320) -> (-205.6667, 320) projected
  line L28 (-205.6667, 320) -> (-205.6667, 369) projected
  line L29 (-246.6667, 369) -> (-205.6667, 369) projected
  line L30 (-246.6667, 351) -> (-246.6667, 369) projected
  line L31 (-246.6667, 351) -> (-590, 351) projected
  line L32 (-590, 351) -> (-590, 271) projected
  line L33 (-590, 271) -> (-572, 271) projected
  arc A3 (-572, 264.65) -> (-572, 271) centre (-572, 267.825) ccw projected
  line L34 (-572, 264.65) -> (-572, -24.65) projected
  circle A4 centre (196.6667, 295.5) radius 3.175 projected
  circle A5 centre (-196.6667, 295.5) radius 3.175 projected
  circle A6 centre (581, 120) radius 3.175 projected
  circle A7 centre (-581, -182) radius 3.175 projected
  circle A8 centre (-581, 311) radius 3.175 projected
  line L35 (-490, -333) -> (-340.5984, 268.5902) projected
  point P0 (0, 0)
  point P1 (572, 274.175)
  dimension "d71" = 3.175
hole "Hole6" at (572, 274.175, 18) direction (0, 0, -1) diameter 6.35 end through all
mirror "Mirror5" about plane through (-590, 120, 0) normal (0, -1, 0) of "Hole6"
sketch "Sketch15" plane through (0, 0, 18) normal (0, 0, 1) x (1, 0, 0)
  line L0 (-540, -351) -> (-540, -333) projected
  line L1 (-540, -333) -> (-490, -333) projected
  point P0 (0, 0)
  point P1 (-536.825, -333)
  point P2 (-515, -333)
  point P3 (-485.6592, -333)
  dimension "d79" = 3.175
hole "Hole7" at (-536.825, -333, 18) direction (0, 0, -1) diameter 6.35 end through all
mirror "Mirror6" about plane through (0, 351, 0) normal (-1, 0, 0) of "Hole7"
sketch "Sketch16" plane through (0, 0, 18) normal (0, 0, 1) x (1, 0, 0)
  arc A0 (540, -333) -> (533.65, -333) centre (536.825, -333) ccw projected
  line L0 (540, -333) -> (540, -351) projected
  line L1 (540, -351) -> (572, -351) projected
  line L2 (572, -351) -> (572, -37.35) projected
  arc A1 (572, -31) -> (572, -37.35) centre (572, -34.175) ccw projected
  line L3 (572, -31) -> (590, -31) projected
  line L4 (590, -31) -> (590, 271) projected
  line L5 (590, 271) -> (572, 271) projected
  arc A2 (572, 277.35) -> (572, 271) centre (572, 274.175) ccw projected
  line L6 (572, 277.35) -> (572, 351) projected
  line L7 (572, 351) -> (246.6667, 351) projected
  line L8 (246.6667, 351) -> (246.6667, 369) projected
  line L9 (246.6667, 369) -> (205.6667, 369) projected
  line L10 (205.6667, 369) -> (205.6667, 320) projected
  line L11 (205.6667, 320) -> (187.6667, 320) projected
  line L12 (187.6667, 320) -> (187.6667, 369) projected
  line L13 (187.6667, 369) -> (146.6667, 369) projected
  line L14 (146.6667, 369) -> (146.6667, 351) projected
  line L15 (146.6667, 351) -> (-146.6667, 351) projected
  line L16 (-146.6667, 369) -> (-146.6667, 351) projected
  line L17 (-187.6667, 369) -> (-146.6667, 369) projected
  line L18 (-187.6667, 369) -> (-187.6667, 320) projected
  line L19 (-187.6667, 320) -> (-205.6667, 320) projected
  line L20 (-205.6667, 320) -> (-205.6667, 369) projected
  line L21 (-246.6667, 369) -> (-205.6667, 369) projected
  line L22 (-246.6667, 351) -> (-246.6667, 369) projected
  line L23 (-246.6667, 351) -> (-590, 351) projected
  line L24 (-590, 351) -> (-590, 271) projected
  line L25 (-590, 271) -> (-572, 271) projected
  arc A3 (-572, 264.65) -> (-572, 271) centre (-572, 267.825) ccw projected
  line L26 (-572, 264.65) -> (-572, -24.65) projected
  arc A4 (-572, -31) -> (-572, -24.65) centre (-572, -27.825) ccw projected
  line L27 (-572, -31) -> (-590, -31) projected
  line L28 (-590, -31) -> (-590, -351) projected
  line L29 (-590, -351) -> (-540, -351) projected
  line L30 (-540, -351) -> (-540, -333) projected
  arc A5 (-533.65, -333) -> (-540, -333) centre (-536.825, -333) ccw projected
  line L31 (-533.65, -333) -> (-490, -333) projected
  arc A6 (-337.517, 271) -> (-340.5984, 268.5902) centre (-337.517, 267.825) ccw projected
  line L32 (-337.517, 271) -> (486.825, 271) projected
  arc A7 (490, 267.825) -> (486.825, 271) centre (486.825, 267.825) ccw projected
  line L33 (490, 267.825) -> (490, -333) projected
  line L34 (490, -333) -> (533.65, -333) projected
  circle A8 centre (196.6667, 295.5) radius 3.175 projected
  circle A9 centre (-196.6667, 295.5) radius 3.175 projected
  circle A10 centre (581, 120) radius 3.175 projected
  circle A11 centre (-581, -182) radius 3.175 projected
  circle A12 centre (-581, 311) radius 3.175 projected
  line L35 (-490, -333) -> (-340.5984, 268.5902) projected
  point P0 (0, 0)
  point P1 (-249.8417, 351)
  point P2 (-205.6667, 323.175)
  dimension "d87" = 3.175
  dimension "d88" = 3.175
hole "Hole8" at (-249.8417, 351, 18) at (-205.6667, 323.175, 18) direction (0, 0, -1) diameter 6.35 end through all
ref_plane "Work Plane3" through (-196.6667, 320, 18) normal (-1, 0, 0) x (0, 0, 1)
mirror "Mirror7" about plane through (-196.6667, 320, 18) normal (-1, 0, 0) of "Hole8"
mirror "Mirror8" about plane through (0, 351, 0) normal (-1, 0, 0) of "Hole8", "Mirror7"
equation "\"d0\" = tableLength"
equation "\"d1\" = legHeight"
equation "\"d2\" = PlyThickness"
equation "\"d4\" = legBaseWidth"
equation "\"d5\" = legTopDepth"
equation "\"d6\" = legTopWidthLong"
equation "\"d97\" = plyThickness"
equation "\"d7\" = PlyThickness"
equation "\"d10\" = PlyThickness"
equation "\"d11\" = PlyThickness"
equation "\"d13\" = PlyThickness"
equation "\"d14\" = PlyThickness"
equation "\"d16\" = PlyThickness"
equation "\"d17\" = PlyThickness"
equation "\"d19\" = PlyThickness"
equation "\"d20\" = PlyThickness"
equation "\"d22\" = 0.5 * millDiameter"
equation "\"d23\" = legTopTabHeight"
equation "\"d24\" = legTabTotalWidth"
equation "\"d25\" = 0.333333 * tableLength"
equation "\"d26\" = PlyThickness"
equation "\"d28\" = plyThickness"
equation "\"d31\" = legTopSlotDepth"
equation "\"d29\" = PlyThickness"
equation "\"d32\" = 0.5 * plyThickness"
equation "\"d33\" = millDiameter"
equation "\"d40\" = 0.5 * plyThickness"
equation "\"d41\" = millDiameter"
equation "\"d48\" = 0.5 * plyThickness"
equation "\"d49\" = millDiameter"
equation "\"d56\" = millDiameter"
equation "\"d63\" = 0.5 * millDiameter"
equation "\"d64\" = millDiameter"
equation "\"d71\" = 0.5 * millDiameter"
equation "\"d72\" = millDiameter"
equation "\"d79\" = 0.5 * millDiameter"
equation "\"d80\" = millDiameter"
equation "\"d87\" = 0.5 * millDiameter"
equation "\"d88\" = 0.5 * millDiameter"
equation "\"d89\" = millDiameter"
equation "\"PlyThickness\" = 18"
equation "\"legHeight\" = 702"
equation "\"plyThickness\" = 18"
equation "\"tableLength\" = 1180"
equation "\"legTopWidthLong\" = 250"
equation "\"legBaseWidth\" = 100"
equation "\"legTopDepth\" = 80"
equation "\"millDiameter\" = 6.35"
equation "\"legTopTabHeight\" = 18"
equation "\"legTabTotalWidth\" = 100"
equation "\"legTopSlotDepth\" = 49"
properties part number "frontLeg"
